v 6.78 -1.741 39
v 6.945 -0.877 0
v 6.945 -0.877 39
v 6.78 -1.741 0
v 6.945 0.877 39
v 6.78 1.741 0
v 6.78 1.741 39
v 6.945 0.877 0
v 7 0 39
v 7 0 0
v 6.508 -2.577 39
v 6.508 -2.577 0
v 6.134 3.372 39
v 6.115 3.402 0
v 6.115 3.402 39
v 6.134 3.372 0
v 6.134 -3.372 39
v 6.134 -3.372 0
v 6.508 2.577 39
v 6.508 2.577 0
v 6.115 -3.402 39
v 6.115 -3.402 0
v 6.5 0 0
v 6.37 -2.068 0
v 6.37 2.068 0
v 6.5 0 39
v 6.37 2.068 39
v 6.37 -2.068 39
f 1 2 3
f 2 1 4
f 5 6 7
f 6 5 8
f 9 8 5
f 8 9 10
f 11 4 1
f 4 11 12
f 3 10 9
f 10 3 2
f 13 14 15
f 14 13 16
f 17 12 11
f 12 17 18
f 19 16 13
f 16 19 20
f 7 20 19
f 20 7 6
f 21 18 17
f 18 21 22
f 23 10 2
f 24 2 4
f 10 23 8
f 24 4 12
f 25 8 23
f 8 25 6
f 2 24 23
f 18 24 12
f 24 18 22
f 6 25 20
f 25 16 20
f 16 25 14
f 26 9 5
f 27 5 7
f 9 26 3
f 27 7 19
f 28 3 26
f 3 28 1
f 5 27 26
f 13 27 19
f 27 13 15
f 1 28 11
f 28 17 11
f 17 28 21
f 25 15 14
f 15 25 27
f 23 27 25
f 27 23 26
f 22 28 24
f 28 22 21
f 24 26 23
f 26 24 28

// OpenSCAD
$fn = 50;


difference() {
	union() {
		cylinder(h = 39, r = 7.0000000000);
		translate(v = [-13.0000000000, 0, 0]) {
			cylinder(h = 39, r = 7.0000000000);
		}
	}
	union() {
		cylinder(h = 39, r = 3.2500000000);
		cylinder(h = 39, r = 1.8000000000);
		cylinder(h = 39, r = 1.8000000000);
		cylinder(h = 39, r = 1.8000000000);
		translate(v = [-17.5000000000, 0, 0]) {
			hull() {
				translate(v = [-3.7500000000, 0.0000000000, 0]) {
					cylinder(h = 39, r = 7.5000000000);
				}
				translate(v = [3.7500000000, 0.0000000000, 0]) {
					cylinder(h = 39, r = 7.5000000000);
				}
				translate(v = [-3.7500000000, -0.0000000000, 0]) {
					cylinder(h = 39, r = 7.5000000000);
				}
				translate(v = [3.7500000000, -0.0000000000, 0]) {
					cylinder(h = 39, r = 7.5000000000);
				}
			}
		}
		translate(v = [-10.0000000000, 0, 0.0000000000]) {
			cylinder(h = 39, r = 16.5000000000);
		}
	}
}
